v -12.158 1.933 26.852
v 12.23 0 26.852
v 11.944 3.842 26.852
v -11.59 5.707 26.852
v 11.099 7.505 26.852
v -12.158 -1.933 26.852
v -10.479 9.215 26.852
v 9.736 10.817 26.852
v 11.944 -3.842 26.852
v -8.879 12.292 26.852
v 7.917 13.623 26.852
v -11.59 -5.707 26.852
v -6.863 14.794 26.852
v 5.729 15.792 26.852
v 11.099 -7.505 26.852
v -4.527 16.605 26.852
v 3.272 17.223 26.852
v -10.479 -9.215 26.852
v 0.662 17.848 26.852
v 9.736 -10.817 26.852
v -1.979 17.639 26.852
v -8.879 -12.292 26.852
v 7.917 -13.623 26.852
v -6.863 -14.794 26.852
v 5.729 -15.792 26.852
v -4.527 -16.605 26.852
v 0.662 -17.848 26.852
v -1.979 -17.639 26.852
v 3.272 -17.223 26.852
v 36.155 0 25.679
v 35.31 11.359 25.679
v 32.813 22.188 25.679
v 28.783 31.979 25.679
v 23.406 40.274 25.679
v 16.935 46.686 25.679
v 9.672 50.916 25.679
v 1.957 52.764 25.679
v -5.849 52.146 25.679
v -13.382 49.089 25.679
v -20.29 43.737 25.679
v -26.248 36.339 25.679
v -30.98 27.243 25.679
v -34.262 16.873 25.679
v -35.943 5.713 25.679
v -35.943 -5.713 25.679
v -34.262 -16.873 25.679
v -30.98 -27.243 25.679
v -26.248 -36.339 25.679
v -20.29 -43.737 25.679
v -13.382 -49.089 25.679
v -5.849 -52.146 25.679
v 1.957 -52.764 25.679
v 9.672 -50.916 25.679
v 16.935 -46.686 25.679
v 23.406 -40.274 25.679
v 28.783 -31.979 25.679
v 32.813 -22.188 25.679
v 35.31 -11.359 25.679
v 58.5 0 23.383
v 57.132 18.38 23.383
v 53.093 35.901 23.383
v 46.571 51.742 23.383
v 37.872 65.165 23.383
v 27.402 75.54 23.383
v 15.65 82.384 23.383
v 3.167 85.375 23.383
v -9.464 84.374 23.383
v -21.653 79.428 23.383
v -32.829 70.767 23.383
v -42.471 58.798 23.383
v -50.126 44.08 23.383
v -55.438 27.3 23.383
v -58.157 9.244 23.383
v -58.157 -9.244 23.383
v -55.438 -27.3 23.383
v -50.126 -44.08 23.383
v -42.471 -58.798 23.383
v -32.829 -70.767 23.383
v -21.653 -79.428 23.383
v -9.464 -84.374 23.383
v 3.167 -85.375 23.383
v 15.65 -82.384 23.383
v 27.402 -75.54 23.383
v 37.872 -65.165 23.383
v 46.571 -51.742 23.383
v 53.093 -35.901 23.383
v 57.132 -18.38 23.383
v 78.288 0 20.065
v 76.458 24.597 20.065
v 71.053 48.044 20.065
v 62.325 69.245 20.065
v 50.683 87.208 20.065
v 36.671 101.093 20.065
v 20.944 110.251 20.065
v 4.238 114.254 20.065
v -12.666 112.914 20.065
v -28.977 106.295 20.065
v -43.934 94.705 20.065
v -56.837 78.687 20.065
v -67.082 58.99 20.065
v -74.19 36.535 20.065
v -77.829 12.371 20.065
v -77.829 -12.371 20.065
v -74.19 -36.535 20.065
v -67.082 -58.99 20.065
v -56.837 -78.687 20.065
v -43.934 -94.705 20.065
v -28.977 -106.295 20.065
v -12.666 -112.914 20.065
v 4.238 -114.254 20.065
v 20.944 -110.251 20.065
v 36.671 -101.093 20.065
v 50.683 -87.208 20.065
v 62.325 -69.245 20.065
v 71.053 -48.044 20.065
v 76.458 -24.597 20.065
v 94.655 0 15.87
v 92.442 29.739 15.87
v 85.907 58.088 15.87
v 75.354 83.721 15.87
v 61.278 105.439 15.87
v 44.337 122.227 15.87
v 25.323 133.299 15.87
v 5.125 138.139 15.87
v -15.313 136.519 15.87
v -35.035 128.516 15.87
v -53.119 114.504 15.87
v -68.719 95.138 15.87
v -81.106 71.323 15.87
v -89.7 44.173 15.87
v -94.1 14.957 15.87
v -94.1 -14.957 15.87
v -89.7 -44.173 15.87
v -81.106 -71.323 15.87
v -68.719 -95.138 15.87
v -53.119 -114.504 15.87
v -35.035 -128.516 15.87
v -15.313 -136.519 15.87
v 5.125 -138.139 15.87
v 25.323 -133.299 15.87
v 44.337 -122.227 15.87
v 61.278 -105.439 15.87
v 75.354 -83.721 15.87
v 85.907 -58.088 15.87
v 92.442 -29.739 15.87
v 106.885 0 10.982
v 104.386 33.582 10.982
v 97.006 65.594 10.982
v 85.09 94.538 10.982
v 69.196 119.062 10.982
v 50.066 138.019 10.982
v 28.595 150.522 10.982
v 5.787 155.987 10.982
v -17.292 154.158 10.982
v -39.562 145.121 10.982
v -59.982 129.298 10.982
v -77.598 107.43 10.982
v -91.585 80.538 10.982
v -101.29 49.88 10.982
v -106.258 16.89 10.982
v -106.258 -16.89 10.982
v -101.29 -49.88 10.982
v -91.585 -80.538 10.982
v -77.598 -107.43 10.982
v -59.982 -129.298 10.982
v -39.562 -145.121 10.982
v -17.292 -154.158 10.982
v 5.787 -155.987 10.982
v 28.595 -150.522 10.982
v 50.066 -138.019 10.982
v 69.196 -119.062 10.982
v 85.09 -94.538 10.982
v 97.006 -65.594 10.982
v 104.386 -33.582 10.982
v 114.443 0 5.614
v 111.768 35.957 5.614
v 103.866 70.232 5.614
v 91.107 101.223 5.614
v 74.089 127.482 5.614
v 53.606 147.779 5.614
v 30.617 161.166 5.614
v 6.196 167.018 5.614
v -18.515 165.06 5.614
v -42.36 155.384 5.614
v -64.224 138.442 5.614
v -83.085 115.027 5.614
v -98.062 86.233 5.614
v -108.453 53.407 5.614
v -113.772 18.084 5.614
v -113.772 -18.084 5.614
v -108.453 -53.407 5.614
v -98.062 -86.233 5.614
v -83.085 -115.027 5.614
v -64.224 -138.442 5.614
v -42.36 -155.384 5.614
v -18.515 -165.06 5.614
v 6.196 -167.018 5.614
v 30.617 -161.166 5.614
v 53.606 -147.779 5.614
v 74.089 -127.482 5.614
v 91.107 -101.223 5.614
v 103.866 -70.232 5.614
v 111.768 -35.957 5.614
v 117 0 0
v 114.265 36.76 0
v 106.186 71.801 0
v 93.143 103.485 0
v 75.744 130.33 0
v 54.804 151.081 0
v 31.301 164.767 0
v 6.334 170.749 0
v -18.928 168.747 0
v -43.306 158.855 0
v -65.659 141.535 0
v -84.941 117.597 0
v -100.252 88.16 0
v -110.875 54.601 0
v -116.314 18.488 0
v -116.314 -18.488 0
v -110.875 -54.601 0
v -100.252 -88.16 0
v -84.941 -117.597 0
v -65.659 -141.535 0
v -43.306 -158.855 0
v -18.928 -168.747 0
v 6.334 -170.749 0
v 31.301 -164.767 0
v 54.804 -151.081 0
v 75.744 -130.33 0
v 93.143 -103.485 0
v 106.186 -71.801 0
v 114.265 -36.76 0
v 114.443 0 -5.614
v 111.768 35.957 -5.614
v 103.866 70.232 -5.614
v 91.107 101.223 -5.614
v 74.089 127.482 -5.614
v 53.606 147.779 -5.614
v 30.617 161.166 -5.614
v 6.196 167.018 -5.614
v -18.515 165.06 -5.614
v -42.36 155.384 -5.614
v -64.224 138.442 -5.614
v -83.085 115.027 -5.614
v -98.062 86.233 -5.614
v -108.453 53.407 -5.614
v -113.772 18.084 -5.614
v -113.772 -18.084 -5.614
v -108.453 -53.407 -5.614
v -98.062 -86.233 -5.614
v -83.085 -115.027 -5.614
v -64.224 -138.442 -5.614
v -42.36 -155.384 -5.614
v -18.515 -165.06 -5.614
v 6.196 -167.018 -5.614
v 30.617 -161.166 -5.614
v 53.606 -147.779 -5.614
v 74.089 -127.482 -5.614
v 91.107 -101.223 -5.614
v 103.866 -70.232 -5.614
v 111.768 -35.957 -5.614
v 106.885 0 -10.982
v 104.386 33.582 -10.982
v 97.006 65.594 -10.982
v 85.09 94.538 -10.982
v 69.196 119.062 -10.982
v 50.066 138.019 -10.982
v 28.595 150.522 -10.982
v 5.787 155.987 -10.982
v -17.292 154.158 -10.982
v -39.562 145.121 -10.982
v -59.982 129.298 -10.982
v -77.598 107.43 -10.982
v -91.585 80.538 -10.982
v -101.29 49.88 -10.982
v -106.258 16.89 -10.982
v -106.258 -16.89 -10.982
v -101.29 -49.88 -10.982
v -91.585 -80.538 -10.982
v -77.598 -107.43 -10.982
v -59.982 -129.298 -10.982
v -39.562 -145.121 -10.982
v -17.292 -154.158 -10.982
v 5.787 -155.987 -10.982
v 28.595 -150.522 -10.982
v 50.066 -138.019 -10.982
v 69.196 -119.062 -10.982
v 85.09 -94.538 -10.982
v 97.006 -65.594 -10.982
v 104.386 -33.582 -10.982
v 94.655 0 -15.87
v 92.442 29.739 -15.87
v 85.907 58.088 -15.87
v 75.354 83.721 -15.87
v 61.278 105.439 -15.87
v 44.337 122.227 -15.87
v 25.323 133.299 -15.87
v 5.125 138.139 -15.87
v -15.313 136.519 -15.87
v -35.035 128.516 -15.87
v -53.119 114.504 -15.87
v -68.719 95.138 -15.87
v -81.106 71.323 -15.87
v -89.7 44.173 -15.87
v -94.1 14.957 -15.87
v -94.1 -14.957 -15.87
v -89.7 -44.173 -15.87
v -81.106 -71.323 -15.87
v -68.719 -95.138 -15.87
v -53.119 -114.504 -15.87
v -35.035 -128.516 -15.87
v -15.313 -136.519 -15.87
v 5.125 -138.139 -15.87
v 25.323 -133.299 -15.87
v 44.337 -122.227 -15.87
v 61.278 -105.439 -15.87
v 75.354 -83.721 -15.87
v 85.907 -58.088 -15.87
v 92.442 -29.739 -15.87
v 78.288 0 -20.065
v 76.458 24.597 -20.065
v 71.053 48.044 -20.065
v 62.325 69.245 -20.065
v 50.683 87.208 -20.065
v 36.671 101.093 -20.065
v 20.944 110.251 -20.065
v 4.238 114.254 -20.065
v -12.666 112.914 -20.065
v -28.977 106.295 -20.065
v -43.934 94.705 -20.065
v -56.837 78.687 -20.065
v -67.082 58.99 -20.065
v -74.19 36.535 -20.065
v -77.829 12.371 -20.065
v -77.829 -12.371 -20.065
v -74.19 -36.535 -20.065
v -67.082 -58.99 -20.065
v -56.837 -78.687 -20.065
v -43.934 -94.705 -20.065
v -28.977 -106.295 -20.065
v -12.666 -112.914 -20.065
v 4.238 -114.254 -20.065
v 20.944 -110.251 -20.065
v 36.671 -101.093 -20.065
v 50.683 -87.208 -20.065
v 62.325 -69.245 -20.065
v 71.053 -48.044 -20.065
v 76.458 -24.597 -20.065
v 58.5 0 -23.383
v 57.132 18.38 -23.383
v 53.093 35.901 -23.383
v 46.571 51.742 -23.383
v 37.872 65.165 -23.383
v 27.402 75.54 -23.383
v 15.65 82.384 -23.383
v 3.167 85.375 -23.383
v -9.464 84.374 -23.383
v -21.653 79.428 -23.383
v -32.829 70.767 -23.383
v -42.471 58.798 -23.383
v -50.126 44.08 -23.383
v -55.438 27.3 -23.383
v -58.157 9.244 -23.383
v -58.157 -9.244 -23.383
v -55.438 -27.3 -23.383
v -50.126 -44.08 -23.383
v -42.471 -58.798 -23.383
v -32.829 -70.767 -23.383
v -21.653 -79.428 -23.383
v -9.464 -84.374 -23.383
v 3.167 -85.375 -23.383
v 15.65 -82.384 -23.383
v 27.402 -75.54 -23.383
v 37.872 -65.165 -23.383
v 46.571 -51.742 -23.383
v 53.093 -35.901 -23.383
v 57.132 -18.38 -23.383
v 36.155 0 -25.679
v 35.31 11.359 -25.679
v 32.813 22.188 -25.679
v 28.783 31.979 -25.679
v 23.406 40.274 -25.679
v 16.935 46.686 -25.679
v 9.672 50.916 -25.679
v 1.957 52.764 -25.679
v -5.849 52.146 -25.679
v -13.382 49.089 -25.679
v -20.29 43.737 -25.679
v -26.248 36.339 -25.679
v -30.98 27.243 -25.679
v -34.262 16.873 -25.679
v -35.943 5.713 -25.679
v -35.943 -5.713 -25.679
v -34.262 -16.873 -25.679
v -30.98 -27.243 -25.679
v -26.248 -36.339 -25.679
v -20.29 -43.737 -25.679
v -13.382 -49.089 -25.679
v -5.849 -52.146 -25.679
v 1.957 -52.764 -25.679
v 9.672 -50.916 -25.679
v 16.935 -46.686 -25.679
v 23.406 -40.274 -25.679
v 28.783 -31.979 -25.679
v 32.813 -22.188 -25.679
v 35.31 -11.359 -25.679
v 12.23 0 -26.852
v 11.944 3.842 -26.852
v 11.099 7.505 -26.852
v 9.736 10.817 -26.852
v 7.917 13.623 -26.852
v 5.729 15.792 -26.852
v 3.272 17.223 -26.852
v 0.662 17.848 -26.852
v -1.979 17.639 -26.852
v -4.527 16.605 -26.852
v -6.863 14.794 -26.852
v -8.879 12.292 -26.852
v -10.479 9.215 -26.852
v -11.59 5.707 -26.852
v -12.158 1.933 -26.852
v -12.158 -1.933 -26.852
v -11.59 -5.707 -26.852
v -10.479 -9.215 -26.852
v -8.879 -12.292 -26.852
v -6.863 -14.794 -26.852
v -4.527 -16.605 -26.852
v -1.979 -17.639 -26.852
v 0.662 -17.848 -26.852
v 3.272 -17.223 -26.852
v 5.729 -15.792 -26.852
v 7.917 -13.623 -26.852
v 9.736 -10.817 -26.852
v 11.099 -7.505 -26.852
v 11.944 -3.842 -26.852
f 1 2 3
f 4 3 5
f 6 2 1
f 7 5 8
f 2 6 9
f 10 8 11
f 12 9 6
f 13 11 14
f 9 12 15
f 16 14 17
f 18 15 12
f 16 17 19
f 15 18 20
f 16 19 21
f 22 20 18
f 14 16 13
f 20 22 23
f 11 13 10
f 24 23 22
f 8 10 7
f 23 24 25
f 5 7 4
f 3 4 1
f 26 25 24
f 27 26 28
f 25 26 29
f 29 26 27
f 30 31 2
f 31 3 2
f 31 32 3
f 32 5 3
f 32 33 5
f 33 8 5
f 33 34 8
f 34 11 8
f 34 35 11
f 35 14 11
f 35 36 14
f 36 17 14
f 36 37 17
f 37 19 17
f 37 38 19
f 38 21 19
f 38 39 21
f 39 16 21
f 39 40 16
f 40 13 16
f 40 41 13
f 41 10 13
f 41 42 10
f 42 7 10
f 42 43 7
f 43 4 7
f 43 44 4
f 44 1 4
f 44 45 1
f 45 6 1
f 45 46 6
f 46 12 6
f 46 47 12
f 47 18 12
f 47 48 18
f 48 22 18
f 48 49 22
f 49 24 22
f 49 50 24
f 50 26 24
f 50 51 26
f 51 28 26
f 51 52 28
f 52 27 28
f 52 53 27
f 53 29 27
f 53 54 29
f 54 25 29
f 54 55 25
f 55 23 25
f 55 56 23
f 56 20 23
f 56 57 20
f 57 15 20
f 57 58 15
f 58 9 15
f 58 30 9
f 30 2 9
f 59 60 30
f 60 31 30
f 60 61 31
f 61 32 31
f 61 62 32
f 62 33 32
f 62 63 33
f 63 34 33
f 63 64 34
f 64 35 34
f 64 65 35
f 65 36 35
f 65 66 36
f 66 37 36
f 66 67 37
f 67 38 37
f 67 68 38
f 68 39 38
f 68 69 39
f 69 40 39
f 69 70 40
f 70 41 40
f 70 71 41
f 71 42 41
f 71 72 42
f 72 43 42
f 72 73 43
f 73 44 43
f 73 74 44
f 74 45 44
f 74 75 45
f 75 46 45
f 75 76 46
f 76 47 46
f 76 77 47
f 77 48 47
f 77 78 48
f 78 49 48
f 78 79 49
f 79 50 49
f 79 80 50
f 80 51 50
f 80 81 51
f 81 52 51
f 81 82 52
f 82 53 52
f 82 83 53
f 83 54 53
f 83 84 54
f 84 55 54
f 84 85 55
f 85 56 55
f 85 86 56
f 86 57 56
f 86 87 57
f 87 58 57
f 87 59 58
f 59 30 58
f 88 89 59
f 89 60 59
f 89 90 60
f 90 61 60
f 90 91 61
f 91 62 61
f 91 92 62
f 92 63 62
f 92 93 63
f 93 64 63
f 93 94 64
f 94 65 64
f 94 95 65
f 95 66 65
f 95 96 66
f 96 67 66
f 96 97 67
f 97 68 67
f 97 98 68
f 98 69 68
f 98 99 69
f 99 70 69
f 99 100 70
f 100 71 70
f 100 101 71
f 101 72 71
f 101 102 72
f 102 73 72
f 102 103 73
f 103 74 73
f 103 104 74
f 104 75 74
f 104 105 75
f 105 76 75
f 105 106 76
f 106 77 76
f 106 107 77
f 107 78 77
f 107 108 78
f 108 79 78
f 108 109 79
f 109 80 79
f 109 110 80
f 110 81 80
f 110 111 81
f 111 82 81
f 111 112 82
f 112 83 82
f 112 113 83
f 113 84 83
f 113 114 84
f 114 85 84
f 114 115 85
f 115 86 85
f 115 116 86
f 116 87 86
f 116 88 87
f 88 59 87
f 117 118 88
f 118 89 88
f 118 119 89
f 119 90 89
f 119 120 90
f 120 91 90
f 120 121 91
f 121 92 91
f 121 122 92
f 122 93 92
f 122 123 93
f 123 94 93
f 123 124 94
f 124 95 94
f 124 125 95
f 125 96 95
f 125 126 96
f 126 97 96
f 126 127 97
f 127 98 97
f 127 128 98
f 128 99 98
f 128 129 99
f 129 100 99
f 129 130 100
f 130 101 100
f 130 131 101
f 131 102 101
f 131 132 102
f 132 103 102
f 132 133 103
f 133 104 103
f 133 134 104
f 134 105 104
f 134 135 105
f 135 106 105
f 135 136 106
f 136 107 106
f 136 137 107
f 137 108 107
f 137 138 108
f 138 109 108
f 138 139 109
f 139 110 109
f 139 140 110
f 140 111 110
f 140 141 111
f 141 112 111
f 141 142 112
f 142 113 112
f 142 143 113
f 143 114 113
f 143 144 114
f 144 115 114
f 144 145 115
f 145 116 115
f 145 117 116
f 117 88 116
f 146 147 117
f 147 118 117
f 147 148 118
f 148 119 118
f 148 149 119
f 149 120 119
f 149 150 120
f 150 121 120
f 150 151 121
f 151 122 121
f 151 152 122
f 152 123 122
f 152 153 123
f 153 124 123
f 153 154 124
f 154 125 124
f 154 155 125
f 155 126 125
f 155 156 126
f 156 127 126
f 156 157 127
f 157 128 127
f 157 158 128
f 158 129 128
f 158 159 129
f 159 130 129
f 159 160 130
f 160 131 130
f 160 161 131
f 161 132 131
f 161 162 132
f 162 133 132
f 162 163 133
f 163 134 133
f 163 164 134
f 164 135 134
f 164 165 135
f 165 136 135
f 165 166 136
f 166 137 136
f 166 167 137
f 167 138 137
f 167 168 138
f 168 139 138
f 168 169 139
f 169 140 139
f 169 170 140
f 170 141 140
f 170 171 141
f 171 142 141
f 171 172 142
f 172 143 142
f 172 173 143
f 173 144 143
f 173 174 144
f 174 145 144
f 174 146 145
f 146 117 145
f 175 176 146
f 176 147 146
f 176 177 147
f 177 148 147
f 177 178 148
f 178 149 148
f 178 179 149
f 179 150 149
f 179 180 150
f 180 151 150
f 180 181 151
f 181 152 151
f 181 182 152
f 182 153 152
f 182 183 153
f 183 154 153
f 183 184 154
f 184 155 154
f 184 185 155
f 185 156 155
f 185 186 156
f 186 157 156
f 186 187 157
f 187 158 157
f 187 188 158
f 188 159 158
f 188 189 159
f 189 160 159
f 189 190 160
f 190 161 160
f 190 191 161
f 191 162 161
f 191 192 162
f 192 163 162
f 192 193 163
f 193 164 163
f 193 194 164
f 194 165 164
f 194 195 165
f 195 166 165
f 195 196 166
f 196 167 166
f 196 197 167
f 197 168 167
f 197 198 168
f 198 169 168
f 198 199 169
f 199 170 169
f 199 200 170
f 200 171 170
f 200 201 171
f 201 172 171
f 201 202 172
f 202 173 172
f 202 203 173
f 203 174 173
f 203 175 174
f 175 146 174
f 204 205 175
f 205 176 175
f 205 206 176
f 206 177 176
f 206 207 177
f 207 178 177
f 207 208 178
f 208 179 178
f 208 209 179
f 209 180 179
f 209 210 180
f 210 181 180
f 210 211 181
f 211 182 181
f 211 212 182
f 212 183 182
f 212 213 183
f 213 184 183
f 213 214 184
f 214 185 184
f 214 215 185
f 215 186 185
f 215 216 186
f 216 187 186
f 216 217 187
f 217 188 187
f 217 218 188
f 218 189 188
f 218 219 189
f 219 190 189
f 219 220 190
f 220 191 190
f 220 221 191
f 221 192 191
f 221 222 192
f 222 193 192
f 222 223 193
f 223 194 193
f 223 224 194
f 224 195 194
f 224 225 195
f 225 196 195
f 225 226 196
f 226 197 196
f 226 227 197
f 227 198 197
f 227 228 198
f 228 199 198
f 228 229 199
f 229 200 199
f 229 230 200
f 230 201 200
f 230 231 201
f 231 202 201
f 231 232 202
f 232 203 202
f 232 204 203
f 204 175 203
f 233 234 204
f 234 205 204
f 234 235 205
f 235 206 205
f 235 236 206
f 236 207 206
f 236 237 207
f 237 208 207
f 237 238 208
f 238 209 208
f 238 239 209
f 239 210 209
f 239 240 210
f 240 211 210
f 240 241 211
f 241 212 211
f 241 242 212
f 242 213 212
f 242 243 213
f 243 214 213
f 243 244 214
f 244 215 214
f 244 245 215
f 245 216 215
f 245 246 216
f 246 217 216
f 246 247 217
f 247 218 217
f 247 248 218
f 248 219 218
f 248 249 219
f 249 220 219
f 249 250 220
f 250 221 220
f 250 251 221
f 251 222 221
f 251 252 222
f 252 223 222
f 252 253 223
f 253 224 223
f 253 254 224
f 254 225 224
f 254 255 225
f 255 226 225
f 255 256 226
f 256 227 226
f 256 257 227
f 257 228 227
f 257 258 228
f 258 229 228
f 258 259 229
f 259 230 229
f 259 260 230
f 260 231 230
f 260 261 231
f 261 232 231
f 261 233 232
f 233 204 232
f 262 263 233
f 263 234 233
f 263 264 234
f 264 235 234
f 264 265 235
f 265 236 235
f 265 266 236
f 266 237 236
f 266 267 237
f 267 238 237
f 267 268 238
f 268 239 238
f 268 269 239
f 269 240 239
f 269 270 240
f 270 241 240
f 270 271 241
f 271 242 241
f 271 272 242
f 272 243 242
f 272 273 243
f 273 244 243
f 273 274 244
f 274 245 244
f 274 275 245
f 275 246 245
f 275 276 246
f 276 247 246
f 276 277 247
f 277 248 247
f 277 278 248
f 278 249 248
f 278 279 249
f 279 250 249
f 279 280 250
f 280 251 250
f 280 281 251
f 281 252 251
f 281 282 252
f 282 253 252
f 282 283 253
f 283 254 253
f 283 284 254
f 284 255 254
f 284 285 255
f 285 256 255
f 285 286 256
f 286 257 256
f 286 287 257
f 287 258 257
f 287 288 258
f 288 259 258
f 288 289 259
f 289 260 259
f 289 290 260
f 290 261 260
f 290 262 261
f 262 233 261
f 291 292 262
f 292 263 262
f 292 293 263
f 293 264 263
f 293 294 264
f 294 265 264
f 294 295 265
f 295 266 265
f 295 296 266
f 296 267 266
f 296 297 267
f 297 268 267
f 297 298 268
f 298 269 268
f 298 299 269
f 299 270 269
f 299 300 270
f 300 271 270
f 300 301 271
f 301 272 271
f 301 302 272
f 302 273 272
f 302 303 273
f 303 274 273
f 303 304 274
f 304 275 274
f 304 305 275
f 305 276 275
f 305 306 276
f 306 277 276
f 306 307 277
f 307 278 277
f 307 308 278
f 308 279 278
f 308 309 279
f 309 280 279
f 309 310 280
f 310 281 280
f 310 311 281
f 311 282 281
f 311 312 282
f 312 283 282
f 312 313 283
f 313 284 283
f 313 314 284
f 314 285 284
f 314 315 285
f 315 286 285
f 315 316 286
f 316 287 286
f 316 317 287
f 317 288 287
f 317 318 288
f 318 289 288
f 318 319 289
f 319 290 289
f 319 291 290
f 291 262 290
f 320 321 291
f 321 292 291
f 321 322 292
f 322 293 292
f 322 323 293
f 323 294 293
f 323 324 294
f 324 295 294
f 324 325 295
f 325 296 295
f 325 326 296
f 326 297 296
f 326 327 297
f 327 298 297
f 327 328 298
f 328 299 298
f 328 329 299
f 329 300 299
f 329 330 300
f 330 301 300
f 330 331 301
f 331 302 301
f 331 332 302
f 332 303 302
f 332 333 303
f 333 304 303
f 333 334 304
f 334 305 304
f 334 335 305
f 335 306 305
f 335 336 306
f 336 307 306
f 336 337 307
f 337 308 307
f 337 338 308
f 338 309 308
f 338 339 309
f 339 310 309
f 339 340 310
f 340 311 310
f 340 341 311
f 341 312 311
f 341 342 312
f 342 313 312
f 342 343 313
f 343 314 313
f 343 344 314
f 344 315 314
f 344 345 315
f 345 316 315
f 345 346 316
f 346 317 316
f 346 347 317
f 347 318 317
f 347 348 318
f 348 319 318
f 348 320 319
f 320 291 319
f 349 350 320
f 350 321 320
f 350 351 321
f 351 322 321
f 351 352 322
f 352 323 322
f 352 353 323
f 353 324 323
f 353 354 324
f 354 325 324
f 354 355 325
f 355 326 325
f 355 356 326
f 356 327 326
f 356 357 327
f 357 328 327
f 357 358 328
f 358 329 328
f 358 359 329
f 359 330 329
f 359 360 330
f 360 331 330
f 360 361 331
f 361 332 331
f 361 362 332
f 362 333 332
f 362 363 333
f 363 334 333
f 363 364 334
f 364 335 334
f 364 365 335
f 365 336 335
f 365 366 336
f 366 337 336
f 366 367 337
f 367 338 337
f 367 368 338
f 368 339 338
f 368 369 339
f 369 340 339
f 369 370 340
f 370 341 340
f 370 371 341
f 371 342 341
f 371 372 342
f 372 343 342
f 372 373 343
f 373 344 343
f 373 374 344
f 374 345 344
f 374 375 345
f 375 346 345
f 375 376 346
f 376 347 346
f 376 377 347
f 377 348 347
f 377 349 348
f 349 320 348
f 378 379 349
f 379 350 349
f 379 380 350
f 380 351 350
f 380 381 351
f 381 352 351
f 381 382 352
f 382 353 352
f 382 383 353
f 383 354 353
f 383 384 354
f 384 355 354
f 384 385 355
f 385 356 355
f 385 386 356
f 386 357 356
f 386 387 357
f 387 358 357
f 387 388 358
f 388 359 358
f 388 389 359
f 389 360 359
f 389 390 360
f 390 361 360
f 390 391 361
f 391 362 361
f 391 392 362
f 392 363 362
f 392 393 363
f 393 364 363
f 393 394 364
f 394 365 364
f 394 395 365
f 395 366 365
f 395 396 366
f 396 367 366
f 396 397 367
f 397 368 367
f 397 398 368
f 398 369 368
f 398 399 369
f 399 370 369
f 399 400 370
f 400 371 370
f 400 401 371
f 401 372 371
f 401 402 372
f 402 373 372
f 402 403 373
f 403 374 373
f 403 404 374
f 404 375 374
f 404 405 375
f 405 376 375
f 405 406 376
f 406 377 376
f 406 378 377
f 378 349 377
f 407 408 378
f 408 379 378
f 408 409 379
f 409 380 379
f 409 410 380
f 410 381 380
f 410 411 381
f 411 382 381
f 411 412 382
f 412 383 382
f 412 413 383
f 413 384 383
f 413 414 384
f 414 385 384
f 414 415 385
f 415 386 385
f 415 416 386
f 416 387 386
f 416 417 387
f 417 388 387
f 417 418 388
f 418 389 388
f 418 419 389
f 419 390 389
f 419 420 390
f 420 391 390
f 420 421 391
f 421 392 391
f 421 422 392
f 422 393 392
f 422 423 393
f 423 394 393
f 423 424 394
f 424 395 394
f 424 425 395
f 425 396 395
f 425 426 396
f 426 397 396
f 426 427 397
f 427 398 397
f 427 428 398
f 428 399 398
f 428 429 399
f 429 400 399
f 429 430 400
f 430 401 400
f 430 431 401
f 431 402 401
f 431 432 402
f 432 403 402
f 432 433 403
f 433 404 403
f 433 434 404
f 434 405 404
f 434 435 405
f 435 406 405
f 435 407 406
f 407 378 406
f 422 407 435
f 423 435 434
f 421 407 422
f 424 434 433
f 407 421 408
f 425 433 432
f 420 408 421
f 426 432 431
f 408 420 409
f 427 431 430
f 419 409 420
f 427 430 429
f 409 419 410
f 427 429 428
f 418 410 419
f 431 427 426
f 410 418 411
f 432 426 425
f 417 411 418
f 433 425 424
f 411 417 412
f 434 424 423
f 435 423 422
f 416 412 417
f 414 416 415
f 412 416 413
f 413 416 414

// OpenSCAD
// Generated by SolidPython 1.0.1 on 2020-07-29 00:46:51


scale(v = [13, 19, 3]) {
	sphere(r = 9);
}
/***********************************************
*********      SolidPython code:      **********
************************************************
 
# import packages: SolidPython
from solid import *
from solid.utils import *
from itertools import chain, combinations, permutations


class Resize:

    def __init__(self, scad_file):
        self.scad_file = scad_file
        #self.scad_file = import_scad(scad_file)
        # cone/cylinder param:
        self.r1 = 0
        self.r2 = 0
        self.h = 0
        # rectangular prism param:
        self.w = 0
        self.l = 0
        # ellipse param:
        self.r = 0

    # import OpenScad code (file name corresponds to shape)


    # classify shape + parameters
    def assign(self, param1, param2, param3):
        if self.scad_file == 'cone.scad':
            self.r1 = param1
            self.r2 = param2
            self.h = param3
        elif self.scad_file == 'cylinder.scad':
            self.r1 = param1
            self.r2 = param2
            self.h = param3
        elif self.scad_file == 'rectangularPrism.scad':
            self.h = param1
            self.l = param2
            self.w = param3
        else:
            self.r = param1
            self.h = param2

    # resize parameters
    def iterate(self):
        x = range(3, 20, 2)
        i = 1
        if self.scad_file == 'cone.scad':
            tempList = list(permutations(x, 2))
            for temp in tempList:
                param1 = temp[0]
                param2 = temp[1]
                filepath = 'produced_scad_files/' + 'cone' + str(param1) + '_' + str(param2) + '_' + '.scad'
                scad_render_to_file(cylinder(h=param1, r1=param2, r2=0), filepath)

        elif self.scad_file == 'cylinder.scad':
            tempList = list(permutations(x, 3))
            for temp in tempList:
                param1 = temp[0]
                param2 = temp[1]
                filepath = 'produced_scad_files/' + 'cylinder' + str(param1) + '_' + str(param2) + '_' + '.scad'
                scad_render_to_file(cylinder(h=param1, r1=param2, r2=param2), filepath)

        elif self.scad_file == 'rectangularPrism.scad':
            tempList = list(permutations(x, 3))
            for temp in tempList:
                param1 = temp[0]
                param2 = temp[1]
                param3 = temp[2]
                filepath = 'produced_scad_files/' + 'rectangularPrism' + str(param1) + '_' + str(param2) + '_' + str(
                    param3) + '.scad'
                scad_render_to_file(cube(size=(param1, param2, param3)), filepath)

        elif self.scad_file == 'ellipse.scad':
            tempList = list(permutations(x, 4))
            for temp in tempList:
                param1 = temp[0]
                param2 = temp[1]
                param3 = temp[2]
                param4 = temp[3]
                filepath = 'produced_scad_files/' + 'ellipse' + str(param1) + '_' + str(param2) + '_' + str(param3) + '_' + str(param4) + '.scad'
                scad_render_to_file(scale([param1, param2, param3])(sphere(r=param4)), filepath)

    def render_to_scadfile(self):
        scad_render_to_file(scad, 'example.scad') 
 
************************************************/
